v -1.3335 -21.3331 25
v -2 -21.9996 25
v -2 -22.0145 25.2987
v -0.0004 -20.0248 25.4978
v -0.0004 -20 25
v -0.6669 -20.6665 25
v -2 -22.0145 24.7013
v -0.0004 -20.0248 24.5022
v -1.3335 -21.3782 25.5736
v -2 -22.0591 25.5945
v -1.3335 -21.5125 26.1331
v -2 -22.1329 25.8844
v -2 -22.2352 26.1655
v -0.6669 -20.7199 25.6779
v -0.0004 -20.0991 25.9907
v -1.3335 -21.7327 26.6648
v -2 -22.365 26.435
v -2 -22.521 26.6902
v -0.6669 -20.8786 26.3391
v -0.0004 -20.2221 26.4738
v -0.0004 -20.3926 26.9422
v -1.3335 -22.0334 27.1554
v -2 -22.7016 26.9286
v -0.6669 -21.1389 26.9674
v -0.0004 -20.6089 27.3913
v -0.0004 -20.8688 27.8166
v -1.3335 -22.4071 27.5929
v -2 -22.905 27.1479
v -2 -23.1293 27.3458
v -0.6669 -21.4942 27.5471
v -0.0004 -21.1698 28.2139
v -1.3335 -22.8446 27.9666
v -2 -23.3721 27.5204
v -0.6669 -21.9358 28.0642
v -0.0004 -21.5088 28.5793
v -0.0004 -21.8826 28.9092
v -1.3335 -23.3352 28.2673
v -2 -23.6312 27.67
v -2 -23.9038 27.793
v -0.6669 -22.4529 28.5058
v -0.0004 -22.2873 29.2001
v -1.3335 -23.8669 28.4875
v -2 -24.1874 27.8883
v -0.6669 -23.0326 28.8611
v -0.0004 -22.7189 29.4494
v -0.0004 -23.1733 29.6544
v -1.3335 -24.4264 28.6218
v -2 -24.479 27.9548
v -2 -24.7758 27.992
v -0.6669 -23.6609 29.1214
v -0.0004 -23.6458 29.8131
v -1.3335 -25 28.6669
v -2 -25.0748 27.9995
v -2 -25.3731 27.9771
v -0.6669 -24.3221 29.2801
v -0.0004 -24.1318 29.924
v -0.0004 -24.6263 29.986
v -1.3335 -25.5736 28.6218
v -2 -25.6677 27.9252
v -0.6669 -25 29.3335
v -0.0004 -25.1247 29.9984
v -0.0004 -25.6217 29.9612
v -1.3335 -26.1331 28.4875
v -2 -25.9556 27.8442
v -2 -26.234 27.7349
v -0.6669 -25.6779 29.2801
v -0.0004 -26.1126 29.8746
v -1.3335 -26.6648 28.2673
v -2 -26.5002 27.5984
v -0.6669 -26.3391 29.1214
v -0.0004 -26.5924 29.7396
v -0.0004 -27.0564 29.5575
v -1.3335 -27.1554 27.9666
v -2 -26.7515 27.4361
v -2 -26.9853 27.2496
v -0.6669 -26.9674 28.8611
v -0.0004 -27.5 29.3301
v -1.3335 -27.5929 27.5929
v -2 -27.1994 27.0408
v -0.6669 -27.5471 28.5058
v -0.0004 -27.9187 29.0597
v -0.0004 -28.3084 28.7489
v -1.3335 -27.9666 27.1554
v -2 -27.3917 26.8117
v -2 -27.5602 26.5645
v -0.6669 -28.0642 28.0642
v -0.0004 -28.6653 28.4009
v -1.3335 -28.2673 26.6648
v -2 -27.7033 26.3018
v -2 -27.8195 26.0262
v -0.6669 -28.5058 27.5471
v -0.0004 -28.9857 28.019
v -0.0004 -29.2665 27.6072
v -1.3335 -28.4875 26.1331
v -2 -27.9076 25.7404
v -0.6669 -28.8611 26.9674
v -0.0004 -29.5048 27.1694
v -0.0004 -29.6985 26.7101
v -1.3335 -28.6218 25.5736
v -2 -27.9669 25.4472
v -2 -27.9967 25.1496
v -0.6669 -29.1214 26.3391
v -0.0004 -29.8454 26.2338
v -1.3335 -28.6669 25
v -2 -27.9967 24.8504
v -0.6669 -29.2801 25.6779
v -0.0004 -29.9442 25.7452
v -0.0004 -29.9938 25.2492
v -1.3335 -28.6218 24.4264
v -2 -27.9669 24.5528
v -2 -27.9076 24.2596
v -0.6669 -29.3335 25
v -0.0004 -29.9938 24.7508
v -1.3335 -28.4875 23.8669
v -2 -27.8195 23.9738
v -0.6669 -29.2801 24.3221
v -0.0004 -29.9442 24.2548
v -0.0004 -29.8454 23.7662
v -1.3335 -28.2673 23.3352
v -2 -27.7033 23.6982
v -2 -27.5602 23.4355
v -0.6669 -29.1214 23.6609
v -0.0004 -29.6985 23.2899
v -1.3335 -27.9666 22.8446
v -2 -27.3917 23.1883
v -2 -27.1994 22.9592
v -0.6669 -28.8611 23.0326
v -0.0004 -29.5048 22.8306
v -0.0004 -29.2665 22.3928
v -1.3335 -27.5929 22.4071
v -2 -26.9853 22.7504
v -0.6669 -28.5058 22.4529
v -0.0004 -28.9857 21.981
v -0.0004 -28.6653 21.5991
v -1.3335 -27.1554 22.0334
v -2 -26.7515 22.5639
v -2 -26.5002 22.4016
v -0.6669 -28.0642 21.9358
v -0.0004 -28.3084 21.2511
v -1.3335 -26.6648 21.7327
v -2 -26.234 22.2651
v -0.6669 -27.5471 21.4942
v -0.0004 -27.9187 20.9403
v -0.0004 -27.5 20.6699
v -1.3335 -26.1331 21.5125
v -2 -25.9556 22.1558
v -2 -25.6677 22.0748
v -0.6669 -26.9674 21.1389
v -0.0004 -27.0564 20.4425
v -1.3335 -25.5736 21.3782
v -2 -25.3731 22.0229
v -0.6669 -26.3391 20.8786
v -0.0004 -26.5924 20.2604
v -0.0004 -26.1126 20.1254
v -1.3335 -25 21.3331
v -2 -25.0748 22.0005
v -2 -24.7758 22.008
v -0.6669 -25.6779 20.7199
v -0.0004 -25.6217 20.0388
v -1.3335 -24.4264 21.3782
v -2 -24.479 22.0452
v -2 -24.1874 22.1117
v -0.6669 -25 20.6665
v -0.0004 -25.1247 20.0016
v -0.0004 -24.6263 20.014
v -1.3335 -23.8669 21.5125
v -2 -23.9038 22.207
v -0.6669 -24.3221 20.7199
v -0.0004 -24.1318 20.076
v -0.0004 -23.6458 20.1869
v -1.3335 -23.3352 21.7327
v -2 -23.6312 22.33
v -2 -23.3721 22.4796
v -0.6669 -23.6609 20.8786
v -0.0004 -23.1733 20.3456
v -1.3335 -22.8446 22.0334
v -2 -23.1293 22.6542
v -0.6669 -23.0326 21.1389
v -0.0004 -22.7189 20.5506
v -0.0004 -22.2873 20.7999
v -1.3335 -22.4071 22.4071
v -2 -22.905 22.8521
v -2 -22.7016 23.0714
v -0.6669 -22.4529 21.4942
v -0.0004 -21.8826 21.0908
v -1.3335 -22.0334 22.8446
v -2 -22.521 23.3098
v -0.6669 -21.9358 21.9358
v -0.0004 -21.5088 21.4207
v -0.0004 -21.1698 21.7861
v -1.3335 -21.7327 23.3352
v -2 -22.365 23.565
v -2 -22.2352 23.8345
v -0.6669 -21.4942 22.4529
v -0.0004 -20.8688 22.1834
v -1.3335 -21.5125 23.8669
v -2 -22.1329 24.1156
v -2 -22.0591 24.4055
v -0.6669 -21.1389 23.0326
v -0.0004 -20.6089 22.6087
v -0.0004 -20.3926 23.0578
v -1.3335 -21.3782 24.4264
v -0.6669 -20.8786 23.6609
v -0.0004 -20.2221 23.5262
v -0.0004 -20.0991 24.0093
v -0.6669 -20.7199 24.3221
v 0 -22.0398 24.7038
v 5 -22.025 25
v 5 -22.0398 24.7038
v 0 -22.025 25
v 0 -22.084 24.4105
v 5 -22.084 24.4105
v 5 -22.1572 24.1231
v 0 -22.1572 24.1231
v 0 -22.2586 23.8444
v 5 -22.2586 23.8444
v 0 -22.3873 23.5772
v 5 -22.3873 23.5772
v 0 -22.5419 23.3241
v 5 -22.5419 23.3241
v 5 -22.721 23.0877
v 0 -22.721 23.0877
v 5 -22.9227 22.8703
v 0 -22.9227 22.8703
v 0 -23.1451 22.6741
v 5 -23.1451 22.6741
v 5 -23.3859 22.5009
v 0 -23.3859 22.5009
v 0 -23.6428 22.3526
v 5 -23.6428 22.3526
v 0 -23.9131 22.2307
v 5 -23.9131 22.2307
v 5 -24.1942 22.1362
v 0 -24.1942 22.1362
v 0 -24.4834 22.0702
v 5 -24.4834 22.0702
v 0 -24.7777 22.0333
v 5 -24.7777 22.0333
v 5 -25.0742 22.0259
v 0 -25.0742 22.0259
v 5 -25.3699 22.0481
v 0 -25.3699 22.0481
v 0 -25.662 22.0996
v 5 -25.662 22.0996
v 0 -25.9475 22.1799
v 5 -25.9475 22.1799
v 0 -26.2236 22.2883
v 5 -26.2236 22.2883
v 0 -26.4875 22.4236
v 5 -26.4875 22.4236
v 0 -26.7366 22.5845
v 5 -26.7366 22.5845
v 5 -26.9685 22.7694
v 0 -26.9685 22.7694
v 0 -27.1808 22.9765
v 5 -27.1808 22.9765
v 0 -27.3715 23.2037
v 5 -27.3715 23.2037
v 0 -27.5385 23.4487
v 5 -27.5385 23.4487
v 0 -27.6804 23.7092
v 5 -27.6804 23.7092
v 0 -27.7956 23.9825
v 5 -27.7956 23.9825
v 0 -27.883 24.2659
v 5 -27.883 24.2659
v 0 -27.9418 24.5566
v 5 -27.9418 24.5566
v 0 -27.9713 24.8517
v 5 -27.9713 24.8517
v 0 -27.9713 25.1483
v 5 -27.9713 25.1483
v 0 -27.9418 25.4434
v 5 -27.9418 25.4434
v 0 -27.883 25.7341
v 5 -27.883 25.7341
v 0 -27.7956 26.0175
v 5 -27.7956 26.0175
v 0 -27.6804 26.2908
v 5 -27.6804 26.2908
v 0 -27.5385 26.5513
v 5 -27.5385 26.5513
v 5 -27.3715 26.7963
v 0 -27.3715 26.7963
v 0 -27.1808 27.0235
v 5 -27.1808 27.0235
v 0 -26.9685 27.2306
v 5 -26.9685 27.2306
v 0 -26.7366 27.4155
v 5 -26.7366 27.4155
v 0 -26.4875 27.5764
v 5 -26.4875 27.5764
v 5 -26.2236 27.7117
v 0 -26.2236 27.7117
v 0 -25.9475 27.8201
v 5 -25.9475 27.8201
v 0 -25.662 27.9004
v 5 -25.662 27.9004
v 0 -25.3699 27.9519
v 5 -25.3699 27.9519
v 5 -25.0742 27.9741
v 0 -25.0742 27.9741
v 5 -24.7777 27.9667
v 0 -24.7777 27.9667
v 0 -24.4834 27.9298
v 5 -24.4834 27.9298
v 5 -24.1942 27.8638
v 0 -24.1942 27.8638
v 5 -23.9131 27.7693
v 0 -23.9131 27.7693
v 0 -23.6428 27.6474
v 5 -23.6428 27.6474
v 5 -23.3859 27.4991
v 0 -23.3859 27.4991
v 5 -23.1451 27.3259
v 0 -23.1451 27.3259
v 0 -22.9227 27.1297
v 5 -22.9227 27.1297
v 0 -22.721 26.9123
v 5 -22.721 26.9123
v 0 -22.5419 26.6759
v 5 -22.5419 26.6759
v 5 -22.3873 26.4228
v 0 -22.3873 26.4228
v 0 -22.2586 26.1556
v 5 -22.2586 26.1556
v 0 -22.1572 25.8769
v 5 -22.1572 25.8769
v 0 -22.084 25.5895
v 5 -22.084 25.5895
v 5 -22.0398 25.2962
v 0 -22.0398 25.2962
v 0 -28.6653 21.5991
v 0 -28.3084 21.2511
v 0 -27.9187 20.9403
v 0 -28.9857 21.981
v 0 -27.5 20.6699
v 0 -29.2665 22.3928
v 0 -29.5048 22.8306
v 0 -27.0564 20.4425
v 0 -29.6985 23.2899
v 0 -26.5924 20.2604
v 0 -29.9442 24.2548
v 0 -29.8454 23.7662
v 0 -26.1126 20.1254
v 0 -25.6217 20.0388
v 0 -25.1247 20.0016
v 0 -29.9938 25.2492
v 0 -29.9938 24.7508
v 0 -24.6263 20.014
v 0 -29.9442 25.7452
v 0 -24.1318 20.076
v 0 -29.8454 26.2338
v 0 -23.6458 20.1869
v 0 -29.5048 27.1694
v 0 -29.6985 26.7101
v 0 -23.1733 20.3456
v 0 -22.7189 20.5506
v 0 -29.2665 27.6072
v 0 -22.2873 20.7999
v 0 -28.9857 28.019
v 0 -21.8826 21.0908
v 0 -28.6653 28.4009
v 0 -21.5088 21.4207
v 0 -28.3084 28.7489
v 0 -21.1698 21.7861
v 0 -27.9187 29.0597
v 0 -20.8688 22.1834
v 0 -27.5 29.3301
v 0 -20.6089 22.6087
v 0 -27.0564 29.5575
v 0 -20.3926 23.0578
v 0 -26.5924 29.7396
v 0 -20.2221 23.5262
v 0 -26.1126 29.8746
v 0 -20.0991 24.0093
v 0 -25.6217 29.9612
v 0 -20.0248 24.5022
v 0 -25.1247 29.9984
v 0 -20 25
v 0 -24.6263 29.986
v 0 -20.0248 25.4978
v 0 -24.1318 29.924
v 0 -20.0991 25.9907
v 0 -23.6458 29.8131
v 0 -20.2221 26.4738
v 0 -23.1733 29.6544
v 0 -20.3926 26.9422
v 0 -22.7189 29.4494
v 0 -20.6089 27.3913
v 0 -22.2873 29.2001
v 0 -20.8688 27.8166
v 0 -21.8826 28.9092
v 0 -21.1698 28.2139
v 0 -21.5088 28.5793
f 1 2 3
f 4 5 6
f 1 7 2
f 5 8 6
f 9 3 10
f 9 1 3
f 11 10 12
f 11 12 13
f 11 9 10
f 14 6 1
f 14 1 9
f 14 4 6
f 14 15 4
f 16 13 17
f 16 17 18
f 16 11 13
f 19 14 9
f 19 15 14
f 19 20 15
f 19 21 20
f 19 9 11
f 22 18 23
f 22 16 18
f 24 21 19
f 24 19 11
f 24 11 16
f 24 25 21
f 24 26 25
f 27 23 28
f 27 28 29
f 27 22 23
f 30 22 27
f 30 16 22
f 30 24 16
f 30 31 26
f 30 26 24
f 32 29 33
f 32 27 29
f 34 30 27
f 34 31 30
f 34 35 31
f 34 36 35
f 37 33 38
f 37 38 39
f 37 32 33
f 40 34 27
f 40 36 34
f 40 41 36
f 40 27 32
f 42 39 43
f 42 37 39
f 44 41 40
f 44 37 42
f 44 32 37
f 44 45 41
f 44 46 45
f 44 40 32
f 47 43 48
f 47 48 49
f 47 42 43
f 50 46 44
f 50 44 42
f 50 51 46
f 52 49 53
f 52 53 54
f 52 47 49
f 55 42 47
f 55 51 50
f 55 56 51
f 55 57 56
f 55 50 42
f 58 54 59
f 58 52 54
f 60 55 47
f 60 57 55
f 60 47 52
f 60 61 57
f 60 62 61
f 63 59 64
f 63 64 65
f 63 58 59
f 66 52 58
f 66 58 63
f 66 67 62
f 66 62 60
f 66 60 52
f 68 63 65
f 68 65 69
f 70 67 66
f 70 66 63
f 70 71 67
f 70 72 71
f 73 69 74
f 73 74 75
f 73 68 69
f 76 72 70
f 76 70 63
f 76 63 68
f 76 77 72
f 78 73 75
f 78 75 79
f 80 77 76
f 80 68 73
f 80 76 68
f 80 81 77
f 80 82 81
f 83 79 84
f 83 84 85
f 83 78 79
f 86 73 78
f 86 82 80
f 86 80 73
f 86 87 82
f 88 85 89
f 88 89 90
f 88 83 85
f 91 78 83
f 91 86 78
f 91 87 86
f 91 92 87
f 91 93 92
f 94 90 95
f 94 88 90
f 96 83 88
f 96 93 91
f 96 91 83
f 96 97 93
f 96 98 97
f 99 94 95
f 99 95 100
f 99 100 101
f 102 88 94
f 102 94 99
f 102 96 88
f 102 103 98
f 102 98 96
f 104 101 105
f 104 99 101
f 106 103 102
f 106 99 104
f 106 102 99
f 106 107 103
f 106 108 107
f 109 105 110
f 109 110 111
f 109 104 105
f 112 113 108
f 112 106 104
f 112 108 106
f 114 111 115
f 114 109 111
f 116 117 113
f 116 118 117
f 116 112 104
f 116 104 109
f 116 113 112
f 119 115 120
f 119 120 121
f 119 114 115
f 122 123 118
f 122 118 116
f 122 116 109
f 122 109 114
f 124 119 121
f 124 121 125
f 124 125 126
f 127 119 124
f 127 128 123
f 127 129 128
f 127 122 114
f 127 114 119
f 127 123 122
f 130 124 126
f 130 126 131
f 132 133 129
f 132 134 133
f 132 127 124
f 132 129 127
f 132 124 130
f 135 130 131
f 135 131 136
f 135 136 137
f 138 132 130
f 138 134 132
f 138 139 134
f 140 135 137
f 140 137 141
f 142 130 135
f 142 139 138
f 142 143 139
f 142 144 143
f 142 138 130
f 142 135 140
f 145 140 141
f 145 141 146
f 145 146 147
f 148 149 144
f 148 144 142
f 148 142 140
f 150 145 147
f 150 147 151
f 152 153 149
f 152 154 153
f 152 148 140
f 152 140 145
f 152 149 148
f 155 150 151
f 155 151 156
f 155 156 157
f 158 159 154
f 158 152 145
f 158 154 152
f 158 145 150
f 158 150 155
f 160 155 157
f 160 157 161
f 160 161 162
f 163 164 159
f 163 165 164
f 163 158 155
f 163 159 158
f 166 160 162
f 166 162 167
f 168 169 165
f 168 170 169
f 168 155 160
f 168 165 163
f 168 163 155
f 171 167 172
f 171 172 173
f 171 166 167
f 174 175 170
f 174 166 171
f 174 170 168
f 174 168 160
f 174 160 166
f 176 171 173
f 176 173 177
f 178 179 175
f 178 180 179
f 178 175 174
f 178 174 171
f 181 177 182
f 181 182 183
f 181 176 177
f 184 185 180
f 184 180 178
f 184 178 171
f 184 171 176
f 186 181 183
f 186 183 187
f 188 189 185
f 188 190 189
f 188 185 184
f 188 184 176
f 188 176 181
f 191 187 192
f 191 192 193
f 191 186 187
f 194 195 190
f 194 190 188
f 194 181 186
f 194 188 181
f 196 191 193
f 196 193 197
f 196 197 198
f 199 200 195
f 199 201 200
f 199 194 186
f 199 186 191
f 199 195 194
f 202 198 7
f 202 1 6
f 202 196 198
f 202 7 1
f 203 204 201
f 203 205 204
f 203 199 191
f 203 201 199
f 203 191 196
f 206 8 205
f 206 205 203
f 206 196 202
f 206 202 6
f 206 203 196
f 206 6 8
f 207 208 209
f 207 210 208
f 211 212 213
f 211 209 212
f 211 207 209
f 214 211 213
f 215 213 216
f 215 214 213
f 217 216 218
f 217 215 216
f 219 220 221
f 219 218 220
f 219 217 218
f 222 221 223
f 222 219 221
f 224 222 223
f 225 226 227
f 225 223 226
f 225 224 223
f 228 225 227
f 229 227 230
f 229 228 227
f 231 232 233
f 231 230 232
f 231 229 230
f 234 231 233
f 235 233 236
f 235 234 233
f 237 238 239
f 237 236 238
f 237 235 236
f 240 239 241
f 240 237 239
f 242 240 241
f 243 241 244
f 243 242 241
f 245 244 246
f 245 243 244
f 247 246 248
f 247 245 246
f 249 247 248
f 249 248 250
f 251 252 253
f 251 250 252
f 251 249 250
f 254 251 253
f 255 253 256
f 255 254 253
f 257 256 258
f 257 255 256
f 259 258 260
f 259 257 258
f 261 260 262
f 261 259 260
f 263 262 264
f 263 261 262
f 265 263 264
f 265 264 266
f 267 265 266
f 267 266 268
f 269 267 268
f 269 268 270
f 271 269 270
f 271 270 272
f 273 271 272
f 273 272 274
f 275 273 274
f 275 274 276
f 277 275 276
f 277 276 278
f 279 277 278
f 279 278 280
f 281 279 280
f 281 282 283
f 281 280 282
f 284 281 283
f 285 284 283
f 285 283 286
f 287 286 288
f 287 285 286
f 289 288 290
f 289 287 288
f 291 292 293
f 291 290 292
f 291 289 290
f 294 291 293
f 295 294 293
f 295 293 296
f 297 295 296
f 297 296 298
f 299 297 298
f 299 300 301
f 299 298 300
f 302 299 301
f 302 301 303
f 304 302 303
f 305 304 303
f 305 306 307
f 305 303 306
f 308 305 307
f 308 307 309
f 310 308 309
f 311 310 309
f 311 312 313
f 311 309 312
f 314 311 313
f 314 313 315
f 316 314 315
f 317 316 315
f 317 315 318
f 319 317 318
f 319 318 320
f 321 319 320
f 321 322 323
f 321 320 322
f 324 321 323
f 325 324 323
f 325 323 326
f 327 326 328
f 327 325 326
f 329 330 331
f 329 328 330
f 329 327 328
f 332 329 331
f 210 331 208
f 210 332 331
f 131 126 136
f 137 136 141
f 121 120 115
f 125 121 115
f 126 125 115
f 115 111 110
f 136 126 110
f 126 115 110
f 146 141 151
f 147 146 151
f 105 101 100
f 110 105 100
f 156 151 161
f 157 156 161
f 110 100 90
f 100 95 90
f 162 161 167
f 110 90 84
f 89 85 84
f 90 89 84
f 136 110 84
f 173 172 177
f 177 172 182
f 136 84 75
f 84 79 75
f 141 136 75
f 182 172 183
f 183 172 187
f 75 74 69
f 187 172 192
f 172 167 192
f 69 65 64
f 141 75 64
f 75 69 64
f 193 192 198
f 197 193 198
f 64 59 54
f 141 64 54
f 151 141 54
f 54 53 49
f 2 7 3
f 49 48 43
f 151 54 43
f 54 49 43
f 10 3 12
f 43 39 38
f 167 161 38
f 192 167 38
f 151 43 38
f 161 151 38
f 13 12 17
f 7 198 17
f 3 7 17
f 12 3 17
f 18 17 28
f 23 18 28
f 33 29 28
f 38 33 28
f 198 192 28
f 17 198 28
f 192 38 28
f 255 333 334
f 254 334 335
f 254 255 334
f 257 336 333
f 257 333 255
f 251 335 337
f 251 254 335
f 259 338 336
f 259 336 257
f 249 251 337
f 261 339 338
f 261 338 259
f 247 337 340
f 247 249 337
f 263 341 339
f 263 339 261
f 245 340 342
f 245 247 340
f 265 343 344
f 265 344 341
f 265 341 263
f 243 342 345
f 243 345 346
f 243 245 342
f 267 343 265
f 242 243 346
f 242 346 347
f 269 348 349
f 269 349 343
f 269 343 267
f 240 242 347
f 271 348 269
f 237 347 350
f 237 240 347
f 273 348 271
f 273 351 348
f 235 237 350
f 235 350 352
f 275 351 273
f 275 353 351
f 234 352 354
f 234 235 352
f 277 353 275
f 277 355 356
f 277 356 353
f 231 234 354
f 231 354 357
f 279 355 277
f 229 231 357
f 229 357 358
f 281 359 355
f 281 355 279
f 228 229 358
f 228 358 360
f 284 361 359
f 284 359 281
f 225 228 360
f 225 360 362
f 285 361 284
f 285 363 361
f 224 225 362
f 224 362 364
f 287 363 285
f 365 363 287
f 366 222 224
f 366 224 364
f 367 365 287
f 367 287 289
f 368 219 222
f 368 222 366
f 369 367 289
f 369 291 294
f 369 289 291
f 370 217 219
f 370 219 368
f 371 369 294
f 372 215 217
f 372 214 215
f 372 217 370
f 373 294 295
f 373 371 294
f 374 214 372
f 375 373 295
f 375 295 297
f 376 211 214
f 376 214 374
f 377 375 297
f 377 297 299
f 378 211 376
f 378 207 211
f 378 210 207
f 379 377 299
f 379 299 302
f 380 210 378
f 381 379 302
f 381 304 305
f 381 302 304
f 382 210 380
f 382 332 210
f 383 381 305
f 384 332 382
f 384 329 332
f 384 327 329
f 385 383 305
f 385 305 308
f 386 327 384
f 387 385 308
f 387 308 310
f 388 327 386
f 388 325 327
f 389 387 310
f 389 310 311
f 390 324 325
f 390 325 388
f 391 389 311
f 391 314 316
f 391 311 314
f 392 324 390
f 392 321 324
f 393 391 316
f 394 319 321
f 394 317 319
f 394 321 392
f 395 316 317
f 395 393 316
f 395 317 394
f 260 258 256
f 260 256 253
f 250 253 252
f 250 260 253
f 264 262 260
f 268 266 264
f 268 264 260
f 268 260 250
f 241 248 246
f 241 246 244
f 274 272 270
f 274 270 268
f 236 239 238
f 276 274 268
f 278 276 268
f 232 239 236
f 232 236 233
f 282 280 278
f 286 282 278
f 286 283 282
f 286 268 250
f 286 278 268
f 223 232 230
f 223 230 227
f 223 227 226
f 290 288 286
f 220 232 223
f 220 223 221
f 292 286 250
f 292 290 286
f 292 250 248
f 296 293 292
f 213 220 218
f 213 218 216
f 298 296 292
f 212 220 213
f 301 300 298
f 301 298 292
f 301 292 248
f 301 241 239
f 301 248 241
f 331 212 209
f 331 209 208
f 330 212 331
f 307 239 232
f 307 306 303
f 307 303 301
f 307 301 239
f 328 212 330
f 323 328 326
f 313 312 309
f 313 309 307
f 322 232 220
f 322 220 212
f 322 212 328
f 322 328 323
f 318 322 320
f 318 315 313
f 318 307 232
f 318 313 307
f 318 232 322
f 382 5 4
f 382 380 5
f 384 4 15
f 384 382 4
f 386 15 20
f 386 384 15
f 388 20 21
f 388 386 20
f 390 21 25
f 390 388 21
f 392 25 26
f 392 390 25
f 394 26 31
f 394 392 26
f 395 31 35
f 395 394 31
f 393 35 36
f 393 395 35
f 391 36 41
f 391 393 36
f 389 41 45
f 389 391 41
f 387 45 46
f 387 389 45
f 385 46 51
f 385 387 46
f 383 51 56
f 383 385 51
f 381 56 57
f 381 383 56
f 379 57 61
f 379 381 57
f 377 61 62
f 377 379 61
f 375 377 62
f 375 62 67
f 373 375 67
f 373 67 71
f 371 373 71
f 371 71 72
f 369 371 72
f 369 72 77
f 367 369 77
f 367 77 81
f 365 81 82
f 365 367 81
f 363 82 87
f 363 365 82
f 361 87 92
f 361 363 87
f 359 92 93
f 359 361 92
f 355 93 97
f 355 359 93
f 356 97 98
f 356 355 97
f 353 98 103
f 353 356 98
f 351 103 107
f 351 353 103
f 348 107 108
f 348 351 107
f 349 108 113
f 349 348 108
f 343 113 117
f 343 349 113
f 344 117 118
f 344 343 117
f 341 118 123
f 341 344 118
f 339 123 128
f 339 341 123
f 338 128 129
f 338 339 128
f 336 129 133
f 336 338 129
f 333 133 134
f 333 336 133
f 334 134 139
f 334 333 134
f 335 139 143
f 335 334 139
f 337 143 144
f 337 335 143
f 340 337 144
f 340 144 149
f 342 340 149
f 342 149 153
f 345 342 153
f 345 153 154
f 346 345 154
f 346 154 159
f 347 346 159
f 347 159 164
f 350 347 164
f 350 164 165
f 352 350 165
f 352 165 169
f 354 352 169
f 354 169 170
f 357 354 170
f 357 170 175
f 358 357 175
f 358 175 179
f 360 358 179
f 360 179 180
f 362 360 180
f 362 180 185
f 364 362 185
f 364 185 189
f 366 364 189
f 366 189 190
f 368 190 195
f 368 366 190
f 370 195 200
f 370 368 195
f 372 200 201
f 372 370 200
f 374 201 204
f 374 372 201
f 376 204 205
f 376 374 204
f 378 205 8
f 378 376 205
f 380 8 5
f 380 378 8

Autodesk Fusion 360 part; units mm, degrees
sketch "Sketch1" plane through (0, 0, 0) normal (1, 0, 0) x (0, 1, 0)
  circle A0 centre (-25, 25) radius 2.975
  circle A1 centre (-25, 25) radius 5
  dimension "d1" = 5.95
  dimension "d4" = 10
extrude "Extrude1" add sketch "Sketch1" along normal blind 5 contours A0
extrude "Extrude2" add sketch "Sketch1" against normal blind 2 contours A0 | A1
chamfer "Chamfer1" distance 2 angle 45 1 edges at (-2, -29.6616, 26.8081) measured on face at (-2, -27.3344, 24.5087)
